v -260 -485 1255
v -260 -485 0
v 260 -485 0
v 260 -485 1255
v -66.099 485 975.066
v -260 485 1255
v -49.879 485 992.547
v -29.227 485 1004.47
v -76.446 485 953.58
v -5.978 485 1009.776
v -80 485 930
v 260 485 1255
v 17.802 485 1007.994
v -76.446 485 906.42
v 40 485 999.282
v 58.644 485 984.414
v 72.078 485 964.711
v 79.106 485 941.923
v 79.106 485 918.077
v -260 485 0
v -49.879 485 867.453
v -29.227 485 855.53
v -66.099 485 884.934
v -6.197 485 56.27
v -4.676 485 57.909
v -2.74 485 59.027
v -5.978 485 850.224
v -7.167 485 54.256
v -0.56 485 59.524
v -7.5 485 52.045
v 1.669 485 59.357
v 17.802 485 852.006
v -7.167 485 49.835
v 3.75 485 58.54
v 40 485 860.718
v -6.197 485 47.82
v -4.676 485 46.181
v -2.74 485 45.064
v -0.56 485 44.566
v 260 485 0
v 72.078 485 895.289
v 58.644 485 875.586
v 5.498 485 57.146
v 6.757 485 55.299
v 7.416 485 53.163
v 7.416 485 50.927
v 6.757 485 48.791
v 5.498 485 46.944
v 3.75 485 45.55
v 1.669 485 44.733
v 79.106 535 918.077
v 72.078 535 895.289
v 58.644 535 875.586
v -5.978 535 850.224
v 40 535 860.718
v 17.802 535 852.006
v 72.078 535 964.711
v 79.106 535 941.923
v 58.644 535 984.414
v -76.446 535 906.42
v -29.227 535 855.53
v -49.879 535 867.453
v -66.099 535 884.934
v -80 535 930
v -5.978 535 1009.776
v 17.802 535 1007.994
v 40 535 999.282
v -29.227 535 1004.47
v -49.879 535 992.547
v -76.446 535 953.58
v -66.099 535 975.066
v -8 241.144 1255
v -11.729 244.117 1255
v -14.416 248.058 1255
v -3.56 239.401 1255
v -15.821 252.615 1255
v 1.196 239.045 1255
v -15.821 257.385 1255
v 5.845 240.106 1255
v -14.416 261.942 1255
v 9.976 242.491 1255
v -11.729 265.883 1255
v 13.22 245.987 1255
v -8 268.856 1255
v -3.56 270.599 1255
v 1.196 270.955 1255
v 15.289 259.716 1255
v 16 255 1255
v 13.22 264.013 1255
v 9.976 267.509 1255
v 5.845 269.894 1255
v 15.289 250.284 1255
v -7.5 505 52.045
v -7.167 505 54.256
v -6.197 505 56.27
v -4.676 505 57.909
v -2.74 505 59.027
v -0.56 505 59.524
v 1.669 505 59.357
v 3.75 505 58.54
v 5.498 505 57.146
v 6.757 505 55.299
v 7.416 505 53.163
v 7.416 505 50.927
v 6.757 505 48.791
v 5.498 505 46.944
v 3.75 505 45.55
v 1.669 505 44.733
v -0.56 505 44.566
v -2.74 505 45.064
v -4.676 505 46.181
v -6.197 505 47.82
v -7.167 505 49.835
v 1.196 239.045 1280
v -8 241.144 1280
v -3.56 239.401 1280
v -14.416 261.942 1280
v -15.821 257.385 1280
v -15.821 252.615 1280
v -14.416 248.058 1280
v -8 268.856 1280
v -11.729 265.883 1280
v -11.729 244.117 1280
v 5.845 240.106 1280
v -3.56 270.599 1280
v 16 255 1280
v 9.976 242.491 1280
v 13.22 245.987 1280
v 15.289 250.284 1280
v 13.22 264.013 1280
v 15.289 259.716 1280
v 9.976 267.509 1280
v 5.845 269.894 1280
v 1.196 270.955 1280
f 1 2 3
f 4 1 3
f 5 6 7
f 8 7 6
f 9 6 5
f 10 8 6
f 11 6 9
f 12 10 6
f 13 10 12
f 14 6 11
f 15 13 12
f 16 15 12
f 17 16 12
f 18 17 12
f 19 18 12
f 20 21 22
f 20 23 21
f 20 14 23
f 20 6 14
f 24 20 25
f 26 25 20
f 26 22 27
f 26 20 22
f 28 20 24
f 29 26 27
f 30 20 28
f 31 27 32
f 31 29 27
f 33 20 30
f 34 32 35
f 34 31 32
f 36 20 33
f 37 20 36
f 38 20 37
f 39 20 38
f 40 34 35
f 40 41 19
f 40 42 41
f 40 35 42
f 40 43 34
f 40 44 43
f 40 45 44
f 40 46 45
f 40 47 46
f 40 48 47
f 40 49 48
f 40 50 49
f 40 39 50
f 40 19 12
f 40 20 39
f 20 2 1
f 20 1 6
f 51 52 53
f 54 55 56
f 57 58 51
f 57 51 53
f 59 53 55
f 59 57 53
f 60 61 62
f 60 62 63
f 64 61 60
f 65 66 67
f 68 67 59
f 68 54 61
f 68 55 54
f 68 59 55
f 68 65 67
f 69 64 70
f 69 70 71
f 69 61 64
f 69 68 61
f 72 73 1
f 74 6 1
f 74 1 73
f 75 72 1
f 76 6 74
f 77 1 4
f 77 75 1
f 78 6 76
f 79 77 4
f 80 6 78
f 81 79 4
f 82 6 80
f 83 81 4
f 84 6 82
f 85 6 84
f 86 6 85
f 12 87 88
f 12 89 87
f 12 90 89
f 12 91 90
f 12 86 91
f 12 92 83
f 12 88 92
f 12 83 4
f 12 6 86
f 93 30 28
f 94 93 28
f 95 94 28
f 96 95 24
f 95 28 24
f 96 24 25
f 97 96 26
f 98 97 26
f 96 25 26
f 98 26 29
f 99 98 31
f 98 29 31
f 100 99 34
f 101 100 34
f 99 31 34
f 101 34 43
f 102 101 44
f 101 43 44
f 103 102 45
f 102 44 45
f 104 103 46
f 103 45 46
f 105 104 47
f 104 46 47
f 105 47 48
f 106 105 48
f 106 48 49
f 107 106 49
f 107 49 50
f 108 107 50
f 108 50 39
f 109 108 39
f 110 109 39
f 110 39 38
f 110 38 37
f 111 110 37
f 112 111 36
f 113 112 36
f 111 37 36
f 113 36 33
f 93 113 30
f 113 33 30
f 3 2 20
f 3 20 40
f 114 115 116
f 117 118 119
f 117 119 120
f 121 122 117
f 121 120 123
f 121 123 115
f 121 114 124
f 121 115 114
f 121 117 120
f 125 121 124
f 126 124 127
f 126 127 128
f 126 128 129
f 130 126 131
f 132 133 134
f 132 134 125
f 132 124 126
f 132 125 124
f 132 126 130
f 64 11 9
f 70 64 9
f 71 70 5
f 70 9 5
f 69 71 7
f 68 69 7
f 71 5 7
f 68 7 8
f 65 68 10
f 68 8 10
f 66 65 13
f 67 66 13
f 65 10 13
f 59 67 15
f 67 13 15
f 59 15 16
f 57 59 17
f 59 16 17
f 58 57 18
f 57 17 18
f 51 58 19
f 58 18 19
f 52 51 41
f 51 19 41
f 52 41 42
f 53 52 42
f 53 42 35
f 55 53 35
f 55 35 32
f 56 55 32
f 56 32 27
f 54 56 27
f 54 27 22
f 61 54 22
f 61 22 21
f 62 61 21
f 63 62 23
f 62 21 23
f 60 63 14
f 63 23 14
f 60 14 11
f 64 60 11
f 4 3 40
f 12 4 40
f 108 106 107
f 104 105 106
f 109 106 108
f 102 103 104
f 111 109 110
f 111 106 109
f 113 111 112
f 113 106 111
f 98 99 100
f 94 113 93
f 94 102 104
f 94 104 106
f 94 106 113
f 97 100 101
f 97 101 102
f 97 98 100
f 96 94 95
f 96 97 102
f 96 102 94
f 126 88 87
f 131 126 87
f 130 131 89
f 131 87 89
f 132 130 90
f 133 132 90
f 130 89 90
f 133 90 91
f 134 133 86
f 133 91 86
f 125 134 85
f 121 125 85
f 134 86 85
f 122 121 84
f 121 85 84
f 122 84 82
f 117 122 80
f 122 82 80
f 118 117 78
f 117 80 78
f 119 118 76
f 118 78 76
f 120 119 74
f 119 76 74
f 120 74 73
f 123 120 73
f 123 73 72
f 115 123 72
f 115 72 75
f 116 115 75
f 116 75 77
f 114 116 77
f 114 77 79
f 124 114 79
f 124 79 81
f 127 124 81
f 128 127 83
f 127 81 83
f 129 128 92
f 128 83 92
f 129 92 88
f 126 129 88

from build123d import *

# Parameters (mm, degrees)
F0_W     = 520
F0_H     = 970
F1_DEPTH = 1255
F2_R     = 80
F3_DEPTH = 50
F5_R     = 7.5
F6_DEPTH = 20
F7_R     = 16
F8_DEPTH = 25


# Not quite as in the source:
# - the program builds the solid bodies; features that only make, move or delete a surface that nothing else refers to are left out


with BuildPart() as f1:
    # F0 (on Top) → F1 (new body)
    with BuildSketch(Plane.XY):
        Rectangle(F0_W, F0_H)
    extrude(amount=F1_DEPTH)

    # F2 (on face) → F3 (join)
    with BuildSketch(Plane(origin=(0, 485, 0), x_dir=(-1, 0, 0), z_dir=(0, 1, 0))):
        with Locations((0, 930)):
            Circle(F2_R)
    extrude(amount=F3_DEPTH)

    # F5 (on face) → F6 (join)
    with BuildSketch(Plane(origin=(0, 485, 0), x_dir=(-1, 0, 0), z_dir=(0, 1, 0))):
        with Locations((0, 52.045196724)):
            Circle(F5_R)
    extrude(amount=F6_DEPTH)

    # F7 (on face) → F8 (join)
    with BuildSketch(Plane.XY.offset(1255)):
        with Locations((0, 255)):
            Circle(F7_R)
    extrude(amount=F8_DEPTH)


solid = f1.part
